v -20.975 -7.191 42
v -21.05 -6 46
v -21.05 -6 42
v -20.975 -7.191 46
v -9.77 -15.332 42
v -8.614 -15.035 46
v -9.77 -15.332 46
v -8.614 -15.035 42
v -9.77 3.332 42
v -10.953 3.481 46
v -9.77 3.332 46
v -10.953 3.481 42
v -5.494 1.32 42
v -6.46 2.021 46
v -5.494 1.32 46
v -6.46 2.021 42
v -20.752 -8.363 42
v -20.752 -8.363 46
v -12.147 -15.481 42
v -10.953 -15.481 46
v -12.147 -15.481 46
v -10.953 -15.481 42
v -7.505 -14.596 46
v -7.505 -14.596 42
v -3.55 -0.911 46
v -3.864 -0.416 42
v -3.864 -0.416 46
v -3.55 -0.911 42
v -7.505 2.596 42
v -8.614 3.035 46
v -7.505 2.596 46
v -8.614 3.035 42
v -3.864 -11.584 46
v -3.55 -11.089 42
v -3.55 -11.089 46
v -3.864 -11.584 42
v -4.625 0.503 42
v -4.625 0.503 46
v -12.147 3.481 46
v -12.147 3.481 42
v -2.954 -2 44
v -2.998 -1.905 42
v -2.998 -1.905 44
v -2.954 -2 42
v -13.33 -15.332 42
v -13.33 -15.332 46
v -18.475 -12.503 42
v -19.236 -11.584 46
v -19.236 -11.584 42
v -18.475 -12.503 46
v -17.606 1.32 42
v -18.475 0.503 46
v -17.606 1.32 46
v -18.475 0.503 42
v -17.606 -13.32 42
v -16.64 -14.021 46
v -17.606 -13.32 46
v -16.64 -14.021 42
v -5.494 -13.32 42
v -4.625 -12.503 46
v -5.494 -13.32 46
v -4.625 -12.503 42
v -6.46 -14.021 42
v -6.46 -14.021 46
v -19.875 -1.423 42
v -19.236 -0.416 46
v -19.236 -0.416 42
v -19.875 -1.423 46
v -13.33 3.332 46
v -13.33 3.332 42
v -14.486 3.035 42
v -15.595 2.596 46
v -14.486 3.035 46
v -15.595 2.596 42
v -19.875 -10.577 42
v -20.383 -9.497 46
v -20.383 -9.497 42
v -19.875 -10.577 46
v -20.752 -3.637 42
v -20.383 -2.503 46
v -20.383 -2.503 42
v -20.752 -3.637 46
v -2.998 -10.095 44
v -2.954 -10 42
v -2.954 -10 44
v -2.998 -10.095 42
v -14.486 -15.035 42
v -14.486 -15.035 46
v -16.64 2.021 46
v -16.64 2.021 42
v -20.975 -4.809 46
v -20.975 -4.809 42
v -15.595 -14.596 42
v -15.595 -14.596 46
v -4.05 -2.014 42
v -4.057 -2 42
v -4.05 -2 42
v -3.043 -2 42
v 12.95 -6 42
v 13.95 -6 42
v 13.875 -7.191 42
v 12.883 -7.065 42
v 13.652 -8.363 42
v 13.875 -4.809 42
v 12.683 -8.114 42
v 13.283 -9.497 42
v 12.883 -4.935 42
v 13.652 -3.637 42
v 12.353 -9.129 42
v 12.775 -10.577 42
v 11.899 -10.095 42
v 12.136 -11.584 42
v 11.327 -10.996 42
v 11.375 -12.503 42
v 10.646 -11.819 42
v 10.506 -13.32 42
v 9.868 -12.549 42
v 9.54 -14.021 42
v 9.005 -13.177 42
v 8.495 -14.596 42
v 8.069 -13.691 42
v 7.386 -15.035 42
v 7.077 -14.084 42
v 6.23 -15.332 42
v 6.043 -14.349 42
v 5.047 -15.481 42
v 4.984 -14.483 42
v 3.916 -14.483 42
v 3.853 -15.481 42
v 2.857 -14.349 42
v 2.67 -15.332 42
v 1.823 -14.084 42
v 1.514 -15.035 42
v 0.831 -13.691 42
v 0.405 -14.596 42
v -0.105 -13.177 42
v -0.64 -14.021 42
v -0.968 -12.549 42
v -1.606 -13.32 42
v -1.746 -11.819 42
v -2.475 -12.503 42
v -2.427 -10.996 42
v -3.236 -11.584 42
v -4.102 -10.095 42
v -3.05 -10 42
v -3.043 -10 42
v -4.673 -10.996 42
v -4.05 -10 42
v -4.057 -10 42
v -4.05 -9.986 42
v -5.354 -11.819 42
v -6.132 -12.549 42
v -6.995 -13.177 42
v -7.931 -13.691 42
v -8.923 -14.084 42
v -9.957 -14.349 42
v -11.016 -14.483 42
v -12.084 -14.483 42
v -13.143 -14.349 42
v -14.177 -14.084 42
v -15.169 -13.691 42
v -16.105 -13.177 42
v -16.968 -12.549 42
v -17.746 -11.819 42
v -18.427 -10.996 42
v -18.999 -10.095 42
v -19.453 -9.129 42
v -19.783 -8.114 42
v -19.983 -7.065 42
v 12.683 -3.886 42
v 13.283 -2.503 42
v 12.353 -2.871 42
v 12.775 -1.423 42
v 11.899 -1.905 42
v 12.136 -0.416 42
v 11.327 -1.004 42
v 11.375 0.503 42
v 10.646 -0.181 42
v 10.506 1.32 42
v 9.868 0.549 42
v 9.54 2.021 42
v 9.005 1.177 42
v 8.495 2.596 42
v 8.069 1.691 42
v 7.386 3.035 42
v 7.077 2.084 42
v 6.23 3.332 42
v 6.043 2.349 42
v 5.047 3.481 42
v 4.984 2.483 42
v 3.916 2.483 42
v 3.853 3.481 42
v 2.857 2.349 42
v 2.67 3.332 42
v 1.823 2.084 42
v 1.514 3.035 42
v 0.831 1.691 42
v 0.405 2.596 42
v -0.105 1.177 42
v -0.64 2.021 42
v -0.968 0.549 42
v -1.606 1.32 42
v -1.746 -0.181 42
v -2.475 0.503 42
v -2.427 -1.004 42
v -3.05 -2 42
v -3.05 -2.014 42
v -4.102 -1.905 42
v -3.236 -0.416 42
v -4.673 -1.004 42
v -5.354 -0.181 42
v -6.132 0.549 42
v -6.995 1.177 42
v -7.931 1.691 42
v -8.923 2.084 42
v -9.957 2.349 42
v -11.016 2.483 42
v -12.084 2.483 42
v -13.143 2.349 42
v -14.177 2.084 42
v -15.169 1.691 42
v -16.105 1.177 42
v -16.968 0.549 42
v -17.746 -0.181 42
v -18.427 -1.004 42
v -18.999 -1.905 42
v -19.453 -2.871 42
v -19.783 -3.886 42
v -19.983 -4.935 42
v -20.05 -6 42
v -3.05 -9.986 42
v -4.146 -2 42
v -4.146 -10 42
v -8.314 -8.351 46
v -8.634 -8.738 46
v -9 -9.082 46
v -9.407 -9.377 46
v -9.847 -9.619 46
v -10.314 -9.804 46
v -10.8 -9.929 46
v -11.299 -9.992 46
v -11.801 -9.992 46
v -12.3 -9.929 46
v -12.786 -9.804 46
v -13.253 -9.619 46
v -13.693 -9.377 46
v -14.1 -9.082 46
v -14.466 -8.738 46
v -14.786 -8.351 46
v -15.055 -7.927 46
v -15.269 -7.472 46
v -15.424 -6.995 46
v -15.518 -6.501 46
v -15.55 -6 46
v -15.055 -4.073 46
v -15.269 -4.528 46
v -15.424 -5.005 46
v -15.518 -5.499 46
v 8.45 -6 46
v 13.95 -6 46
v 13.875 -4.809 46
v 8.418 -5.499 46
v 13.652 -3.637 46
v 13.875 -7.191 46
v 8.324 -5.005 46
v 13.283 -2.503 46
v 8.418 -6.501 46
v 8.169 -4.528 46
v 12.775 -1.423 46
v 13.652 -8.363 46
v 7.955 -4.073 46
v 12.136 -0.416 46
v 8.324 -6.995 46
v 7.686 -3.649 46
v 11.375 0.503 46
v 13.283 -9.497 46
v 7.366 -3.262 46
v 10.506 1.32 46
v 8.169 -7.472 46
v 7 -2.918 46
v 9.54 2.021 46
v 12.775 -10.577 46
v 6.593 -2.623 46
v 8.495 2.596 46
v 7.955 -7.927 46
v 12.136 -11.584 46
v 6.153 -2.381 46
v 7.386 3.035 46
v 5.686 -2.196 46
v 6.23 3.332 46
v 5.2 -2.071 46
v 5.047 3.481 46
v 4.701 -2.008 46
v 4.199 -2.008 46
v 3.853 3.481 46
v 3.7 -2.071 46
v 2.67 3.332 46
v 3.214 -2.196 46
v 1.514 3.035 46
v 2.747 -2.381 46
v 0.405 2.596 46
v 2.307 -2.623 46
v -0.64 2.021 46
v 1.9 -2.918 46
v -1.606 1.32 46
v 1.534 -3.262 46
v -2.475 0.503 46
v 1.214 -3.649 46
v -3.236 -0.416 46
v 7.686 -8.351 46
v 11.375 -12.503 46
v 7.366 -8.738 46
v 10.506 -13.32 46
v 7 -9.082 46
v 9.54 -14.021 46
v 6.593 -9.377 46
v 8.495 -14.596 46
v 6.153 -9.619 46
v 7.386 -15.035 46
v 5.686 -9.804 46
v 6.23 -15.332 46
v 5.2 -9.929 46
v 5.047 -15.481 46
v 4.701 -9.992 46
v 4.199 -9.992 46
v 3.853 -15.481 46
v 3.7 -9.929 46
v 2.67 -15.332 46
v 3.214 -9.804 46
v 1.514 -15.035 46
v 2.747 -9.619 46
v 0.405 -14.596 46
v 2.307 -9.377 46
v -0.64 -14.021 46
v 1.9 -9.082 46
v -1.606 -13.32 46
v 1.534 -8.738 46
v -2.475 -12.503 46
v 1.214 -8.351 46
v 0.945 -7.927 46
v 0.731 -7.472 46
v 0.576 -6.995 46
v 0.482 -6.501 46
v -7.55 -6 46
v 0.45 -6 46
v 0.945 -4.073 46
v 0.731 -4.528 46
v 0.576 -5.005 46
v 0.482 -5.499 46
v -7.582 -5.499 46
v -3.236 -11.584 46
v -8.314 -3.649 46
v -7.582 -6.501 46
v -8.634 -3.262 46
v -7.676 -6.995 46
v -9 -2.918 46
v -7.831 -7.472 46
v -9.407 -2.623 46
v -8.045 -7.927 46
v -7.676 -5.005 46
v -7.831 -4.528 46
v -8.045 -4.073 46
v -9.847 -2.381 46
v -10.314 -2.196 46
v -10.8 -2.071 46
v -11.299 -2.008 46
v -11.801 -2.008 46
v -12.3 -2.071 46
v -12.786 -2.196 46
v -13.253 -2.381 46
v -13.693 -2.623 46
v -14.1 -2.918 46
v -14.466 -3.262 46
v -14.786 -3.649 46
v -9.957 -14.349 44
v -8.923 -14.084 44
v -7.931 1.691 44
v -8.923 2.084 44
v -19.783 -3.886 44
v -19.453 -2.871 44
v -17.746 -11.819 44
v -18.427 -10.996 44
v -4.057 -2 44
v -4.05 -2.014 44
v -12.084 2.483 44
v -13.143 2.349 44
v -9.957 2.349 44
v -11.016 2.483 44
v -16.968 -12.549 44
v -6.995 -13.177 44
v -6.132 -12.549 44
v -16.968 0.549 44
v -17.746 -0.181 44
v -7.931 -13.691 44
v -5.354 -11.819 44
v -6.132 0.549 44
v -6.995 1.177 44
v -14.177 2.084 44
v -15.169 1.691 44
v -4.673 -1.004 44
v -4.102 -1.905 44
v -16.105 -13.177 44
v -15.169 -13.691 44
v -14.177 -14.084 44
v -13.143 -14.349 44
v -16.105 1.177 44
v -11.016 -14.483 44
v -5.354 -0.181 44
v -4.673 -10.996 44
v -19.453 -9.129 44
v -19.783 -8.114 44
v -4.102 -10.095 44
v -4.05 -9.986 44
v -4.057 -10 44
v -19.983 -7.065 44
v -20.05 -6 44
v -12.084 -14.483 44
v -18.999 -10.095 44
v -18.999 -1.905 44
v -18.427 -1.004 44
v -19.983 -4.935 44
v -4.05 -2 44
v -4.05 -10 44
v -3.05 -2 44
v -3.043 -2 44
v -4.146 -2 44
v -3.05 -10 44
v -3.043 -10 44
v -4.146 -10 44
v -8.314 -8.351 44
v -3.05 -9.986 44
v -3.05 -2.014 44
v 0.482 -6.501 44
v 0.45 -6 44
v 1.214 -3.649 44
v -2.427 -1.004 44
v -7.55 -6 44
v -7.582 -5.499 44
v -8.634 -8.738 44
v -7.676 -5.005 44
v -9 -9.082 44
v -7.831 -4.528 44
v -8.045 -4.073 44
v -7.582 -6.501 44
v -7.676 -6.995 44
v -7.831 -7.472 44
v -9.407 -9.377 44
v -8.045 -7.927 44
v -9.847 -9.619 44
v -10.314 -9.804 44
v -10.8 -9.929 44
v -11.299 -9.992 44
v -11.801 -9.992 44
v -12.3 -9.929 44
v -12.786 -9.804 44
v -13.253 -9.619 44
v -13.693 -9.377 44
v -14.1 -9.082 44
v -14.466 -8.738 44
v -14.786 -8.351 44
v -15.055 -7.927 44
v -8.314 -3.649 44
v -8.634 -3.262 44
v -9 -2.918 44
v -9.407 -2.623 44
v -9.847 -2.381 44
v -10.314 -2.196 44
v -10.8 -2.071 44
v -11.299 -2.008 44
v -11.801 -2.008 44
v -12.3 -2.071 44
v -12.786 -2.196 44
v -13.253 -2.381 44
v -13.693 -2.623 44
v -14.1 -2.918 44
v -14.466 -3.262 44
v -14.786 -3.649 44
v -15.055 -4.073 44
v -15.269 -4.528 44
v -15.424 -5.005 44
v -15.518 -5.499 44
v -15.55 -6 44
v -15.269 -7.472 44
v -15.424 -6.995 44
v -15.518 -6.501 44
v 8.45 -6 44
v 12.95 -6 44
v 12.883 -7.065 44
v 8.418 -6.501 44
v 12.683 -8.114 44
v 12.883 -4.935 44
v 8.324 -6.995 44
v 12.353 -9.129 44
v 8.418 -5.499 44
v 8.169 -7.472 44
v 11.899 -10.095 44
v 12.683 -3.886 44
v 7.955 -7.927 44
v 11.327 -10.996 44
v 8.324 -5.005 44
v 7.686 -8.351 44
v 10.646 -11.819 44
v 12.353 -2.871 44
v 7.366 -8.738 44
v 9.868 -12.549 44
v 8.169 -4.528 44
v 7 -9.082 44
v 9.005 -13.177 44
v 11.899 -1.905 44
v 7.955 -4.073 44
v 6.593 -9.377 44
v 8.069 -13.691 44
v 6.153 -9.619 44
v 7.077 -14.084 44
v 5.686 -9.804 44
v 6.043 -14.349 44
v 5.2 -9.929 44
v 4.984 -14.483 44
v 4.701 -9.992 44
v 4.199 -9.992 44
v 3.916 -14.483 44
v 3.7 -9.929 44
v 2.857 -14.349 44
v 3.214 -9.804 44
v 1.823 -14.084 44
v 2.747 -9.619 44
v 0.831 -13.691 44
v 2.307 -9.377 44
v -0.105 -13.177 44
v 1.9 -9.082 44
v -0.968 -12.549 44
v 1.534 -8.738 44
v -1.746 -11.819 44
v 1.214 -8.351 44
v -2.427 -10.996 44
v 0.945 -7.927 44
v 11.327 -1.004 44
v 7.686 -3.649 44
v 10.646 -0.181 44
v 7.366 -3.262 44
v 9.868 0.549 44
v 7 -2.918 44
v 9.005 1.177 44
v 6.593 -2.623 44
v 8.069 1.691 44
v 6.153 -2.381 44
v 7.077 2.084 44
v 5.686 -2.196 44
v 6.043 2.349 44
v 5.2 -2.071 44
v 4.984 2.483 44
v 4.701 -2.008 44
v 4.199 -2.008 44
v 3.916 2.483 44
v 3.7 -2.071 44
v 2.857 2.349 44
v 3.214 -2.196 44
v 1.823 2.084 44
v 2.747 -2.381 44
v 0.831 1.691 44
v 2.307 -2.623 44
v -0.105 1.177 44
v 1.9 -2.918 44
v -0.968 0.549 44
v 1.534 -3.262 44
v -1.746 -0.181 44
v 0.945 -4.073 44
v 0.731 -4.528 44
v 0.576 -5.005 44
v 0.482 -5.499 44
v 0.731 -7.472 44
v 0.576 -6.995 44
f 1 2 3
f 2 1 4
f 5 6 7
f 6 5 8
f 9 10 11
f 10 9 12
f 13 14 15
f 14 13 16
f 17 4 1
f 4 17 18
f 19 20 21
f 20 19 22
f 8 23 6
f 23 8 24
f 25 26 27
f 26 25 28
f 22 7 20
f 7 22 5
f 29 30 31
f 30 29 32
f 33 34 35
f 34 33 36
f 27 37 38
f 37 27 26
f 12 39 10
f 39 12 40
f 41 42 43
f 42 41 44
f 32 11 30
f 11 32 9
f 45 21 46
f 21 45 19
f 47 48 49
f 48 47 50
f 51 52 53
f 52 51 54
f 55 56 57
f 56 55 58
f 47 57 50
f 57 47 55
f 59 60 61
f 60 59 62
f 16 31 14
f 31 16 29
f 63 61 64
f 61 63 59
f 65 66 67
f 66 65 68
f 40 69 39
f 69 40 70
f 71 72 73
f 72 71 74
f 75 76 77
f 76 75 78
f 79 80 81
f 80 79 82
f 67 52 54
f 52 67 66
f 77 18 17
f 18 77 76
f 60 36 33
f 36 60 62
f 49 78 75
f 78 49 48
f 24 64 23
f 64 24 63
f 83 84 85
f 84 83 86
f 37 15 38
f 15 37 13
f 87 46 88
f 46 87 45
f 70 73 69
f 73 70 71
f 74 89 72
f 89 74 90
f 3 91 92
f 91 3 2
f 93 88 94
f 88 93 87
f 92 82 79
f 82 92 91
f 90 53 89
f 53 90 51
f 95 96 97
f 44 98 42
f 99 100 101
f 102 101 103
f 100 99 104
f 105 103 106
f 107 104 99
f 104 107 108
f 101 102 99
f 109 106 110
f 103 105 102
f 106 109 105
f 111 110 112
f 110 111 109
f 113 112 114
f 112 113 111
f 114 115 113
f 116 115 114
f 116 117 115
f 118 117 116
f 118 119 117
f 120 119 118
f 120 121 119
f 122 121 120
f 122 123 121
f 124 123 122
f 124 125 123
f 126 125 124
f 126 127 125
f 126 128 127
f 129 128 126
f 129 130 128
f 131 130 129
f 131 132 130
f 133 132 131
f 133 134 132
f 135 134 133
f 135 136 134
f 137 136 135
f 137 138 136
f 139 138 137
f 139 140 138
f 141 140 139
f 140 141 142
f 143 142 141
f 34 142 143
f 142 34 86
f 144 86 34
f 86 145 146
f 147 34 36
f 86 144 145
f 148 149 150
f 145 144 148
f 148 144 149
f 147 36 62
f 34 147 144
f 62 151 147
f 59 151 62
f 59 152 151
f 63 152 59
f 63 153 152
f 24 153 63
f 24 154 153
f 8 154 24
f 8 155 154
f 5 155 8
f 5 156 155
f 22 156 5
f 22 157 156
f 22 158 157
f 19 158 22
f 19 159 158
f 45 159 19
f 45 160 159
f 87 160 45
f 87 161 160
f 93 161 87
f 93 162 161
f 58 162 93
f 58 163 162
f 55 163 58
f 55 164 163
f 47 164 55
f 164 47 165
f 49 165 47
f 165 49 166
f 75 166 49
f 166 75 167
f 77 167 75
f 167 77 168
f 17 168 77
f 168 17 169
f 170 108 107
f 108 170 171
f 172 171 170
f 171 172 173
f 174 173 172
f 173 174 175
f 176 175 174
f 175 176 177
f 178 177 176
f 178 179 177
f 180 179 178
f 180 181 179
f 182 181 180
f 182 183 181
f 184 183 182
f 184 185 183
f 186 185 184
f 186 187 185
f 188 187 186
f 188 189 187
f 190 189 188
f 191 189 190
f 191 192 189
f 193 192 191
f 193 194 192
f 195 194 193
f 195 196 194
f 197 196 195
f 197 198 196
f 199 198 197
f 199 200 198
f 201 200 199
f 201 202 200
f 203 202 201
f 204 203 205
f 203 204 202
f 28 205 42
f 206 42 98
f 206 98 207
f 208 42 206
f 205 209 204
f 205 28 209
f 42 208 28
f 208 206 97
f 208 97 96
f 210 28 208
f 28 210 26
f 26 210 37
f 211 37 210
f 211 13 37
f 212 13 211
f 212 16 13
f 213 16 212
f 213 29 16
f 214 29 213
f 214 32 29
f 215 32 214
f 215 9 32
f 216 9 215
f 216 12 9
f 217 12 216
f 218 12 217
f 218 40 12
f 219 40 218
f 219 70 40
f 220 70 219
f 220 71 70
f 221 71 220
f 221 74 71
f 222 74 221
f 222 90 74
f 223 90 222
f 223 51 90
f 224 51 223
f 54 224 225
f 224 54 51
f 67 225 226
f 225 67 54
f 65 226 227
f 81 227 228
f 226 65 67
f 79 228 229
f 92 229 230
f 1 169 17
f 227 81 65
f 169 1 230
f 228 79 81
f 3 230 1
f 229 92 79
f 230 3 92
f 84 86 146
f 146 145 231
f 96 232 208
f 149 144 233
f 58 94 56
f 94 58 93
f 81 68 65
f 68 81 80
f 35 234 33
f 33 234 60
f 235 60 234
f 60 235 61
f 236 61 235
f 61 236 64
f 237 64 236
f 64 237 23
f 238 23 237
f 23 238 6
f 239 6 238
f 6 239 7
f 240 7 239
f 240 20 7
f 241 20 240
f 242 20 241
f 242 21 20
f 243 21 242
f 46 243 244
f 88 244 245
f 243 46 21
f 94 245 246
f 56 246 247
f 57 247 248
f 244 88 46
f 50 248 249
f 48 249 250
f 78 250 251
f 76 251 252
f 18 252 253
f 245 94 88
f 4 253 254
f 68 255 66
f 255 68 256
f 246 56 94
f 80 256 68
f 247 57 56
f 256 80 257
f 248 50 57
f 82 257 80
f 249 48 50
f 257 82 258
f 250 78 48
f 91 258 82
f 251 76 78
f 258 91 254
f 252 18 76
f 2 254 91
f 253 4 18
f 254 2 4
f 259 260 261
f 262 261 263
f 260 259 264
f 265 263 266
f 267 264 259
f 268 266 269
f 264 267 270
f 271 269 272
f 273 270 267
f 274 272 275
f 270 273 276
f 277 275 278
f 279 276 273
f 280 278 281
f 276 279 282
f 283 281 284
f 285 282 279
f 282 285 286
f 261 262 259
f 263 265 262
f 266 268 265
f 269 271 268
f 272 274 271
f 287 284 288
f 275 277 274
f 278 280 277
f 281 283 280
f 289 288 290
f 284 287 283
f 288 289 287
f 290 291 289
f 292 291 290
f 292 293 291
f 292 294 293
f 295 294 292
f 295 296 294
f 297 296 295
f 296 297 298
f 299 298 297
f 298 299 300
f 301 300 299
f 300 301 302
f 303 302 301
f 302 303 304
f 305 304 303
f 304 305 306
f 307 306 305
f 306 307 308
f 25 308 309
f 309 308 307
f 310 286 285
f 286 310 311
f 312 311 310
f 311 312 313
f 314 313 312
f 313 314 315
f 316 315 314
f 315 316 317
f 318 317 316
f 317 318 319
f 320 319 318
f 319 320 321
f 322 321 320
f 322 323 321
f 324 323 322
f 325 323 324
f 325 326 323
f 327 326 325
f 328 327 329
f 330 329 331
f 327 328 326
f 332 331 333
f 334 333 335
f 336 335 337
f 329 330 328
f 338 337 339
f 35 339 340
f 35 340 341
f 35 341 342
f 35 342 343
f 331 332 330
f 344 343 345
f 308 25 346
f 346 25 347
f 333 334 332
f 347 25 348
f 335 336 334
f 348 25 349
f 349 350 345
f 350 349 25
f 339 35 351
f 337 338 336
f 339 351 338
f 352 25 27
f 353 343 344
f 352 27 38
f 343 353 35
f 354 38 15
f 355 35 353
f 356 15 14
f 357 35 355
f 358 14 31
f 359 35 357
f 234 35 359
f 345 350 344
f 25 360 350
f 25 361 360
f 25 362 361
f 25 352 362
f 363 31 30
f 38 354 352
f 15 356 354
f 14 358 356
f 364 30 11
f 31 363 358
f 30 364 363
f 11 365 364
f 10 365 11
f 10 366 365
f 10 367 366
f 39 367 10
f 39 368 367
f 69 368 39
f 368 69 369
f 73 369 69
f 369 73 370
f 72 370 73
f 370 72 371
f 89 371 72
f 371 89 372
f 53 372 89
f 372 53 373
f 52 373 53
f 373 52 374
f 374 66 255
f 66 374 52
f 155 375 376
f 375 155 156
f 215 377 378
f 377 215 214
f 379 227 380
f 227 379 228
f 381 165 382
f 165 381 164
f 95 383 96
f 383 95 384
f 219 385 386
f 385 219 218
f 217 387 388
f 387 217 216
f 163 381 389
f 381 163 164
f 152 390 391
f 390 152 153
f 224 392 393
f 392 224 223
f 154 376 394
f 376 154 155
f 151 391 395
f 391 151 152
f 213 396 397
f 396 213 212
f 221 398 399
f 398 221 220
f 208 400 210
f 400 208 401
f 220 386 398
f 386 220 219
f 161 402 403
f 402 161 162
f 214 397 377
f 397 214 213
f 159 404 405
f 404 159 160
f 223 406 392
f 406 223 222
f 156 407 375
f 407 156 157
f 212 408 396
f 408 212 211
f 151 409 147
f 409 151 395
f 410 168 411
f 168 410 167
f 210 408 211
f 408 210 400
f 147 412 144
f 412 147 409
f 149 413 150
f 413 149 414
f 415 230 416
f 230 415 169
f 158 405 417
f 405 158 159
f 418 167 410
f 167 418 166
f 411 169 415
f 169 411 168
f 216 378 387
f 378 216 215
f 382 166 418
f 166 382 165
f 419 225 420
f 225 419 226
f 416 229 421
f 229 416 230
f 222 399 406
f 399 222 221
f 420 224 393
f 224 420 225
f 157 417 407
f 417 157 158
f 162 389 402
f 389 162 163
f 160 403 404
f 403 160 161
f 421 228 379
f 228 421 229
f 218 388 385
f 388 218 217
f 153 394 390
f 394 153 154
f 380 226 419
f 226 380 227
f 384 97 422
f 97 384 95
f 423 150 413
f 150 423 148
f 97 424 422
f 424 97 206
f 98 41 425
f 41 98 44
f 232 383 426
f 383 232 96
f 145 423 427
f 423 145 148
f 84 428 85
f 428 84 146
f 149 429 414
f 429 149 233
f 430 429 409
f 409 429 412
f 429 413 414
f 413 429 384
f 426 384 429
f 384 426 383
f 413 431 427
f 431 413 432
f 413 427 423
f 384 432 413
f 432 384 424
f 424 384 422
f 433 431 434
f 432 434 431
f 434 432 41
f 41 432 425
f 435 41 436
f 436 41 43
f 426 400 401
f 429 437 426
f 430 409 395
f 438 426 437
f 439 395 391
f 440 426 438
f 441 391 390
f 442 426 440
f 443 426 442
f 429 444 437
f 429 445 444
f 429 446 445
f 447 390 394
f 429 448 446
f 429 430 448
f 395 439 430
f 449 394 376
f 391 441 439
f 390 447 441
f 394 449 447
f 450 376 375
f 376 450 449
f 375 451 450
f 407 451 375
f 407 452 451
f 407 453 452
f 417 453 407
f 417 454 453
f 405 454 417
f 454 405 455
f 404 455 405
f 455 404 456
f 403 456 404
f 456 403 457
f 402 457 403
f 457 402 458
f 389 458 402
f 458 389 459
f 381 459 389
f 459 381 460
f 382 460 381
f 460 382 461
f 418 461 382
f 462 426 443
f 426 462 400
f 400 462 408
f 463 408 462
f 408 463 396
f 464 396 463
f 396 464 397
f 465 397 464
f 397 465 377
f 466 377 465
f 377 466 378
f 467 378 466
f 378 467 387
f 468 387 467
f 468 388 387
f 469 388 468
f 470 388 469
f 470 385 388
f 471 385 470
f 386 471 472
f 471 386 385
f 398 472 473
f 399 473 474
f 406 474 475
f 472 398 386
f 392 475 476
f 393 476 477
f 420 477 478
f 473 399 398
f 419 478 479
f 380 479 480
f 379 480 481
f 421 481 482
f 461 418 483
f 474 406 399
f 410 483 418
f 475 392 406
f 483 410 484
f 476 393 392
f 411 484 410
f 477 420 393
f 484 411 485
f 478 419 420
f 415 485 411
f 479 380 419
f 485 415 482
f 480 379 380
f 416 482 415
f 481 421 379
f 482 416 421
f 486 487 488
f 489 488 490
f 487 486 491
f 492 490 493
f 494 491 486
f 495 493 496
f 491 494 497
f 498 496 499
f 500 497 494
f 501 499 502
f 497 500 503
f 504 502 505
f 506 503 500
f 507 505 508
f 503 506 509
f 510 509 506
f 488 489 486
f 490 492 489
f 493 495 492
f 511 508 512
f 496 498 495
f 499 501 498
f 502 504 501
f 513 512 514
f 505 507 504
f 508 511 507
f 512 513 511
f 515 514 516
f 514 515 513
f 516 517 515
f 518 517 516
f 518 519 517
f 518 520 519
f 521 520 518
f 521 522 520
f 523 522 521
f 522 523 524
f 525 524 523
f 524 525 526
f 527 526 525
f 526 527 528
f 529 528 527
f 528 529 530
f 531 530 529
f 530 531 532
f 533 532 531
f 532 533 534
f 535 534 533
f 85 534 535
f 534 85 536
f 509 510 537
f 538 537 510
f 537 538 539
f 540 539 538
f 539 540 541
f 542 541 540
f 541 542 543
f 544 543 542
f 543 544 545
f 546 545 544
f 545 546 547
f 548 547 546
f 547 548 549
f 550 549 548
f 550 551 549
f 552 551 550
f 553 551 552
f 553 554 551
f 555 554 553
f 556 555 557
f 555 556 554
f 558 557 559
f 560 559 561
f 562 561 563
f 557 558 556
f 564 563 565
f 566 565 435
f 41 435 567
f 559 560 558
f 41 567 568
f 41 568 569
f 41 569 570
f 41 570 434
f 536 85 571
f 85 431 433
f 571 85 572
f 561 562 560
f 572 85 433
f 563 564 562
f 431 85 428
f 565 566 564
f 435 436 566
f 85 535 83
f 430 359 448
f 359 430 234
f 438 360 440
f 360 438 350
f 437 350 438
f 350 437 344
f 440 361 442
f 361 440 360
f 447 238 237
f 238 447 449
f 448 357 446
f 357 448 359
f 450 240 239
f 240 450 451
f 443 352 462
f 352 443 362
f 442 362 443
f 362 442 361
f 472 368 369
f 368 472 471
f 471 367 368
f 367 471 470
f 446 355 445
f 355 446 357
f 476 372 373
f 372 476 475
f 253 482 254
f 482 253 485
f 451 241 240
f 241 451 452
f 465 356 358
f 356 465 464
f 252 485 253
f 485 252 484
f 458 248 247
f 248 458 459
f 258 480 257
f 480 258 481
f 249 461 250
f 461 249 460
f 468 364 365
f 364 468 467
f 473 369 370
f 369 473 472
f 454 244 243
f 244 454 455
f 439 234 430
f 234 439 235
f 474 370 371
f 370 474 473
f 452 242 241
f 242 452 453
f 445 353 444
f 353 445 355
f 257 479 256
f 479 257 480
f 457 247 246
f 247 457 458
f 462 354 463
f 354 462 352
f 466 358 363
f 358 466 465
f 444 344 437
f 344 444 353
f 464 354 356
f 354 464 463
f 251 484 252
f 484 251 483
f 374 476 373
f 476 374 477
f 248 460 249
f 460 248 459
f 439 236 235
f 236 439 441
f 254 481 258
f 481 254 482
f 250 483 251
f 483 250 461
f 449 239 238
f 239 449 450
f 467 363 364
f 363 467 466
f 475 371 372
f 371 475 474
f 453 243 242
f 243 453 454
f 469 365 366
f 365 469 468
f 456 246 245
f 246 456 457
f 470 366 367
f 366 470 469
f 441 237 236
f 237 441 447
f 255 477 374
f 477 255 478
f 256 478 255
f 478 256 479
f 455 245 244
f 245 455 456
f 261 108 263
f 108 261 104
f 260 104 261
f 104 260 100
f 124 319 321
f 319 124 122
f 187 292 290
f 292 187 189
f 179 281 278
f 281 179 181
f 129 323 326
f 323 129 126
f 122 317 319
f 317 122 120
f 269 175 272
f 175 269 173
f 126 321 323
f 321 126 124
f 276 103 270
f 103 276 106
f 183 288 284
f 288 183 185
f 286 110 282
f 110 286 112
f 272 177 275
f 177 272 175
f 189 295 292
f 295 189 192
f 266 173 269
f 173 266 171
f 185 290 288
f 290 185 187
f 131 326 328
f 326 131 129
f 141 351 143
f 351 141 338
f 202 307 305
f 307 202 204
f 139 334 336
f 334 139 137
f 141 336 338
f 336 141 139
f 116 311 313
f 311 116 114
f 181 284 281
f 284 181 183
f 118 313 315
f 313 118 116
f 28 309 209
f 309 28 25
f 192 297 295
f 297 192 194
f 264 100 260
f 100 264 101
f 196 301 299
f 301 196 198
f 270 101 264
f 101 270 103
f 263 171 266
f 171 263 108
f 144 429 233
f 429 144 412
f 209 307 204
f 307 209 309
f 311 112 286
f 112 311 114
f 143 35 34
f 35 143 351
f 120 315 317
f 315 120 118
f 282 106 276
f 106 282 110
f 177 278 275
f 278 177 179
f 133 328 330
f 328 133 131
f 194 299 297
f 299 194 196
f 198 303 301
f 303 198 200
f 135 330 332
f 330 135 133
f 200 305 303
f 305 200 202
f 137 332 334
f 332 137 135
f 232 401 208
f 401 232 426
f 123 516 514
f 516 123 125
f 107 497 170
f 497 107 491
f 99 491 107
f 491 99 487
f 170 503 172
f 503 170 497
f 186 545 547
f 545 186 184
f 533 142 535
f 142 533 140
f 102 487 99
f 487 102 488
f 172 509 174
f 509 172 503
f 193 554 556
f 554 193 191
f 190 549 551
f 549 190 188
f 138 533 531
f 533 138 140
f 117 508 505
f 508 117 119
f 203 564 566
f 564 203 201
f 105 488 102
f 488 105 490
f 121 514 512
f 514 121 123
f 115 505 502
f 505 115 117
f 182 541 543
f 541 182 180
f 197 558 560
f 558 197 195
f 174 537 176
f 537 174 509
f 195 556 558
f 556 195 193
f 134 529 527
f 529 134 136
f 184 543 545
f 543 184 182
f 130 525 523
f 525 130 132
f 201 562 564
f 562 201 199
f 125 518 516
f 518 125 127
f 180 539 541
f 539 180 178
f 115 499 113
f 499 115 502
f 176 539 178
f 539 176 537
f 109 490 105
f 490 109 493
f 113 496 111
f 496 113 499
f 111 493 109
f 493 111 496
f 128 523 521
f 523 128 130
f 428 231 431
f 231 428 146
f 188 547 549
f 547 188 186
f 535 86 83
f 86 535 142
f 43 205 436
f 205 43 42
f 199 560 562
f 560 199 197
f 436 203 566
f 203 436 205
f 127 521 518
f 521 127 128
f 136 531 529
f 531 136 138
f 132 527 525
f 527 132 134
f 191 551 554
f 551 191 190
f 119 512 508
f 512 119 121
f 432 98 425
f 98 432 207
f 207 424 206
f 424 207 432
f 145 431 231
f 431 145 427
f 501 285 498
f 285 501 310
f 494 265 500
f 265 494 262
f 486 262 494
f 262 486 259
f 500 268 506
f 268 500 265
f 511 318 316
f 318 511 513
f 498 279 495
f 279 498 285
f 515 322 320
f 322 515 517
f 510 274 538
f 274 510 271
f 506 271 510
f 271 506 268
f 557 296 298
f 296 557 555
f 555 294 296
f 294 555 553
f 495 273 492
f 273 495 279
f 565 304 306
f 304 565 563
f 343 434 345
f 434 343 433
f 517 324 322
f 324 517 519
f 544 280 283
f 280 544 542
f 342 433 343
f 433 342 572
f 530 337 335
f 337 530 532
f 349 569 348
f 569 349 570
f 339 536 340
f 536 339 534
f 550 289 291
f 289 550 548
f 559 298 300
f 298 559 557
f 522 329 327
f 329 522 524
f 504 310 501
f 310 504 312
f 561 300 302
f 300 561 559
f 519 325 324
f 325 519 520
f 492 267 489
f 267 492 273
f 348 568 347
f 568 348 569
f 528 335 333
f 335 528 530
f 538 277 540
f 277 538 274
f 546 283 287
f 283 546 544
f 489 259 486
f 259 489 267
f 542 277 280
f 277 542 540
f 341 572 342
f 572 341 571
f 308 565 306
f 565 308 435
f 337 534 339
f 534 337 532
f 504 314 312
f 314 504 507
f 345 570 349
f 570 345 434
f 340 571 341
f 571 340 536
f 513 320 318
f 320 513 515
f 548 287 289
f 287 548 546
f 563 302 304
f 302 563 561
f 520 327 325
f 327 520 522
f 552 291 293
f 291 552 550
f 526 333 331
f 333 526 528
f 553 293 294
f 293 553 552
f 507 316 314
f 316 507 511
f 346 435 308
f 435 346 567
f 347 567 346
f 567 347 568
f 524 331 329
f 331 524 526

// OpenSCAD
$fn = 50;

render_platform = false;
render_stage = false;
render_sensor_cap = true;
render_solenoid = false;
render_cartridge = false;

// all units in millimeters

solenoid_body_color = "Red";
// dimensions for solenoid at http://www.amazon.com/gp/product/B00DUYPQHU/ref=oh_aui_detailpage_o03_s00?ie=UTF8&psc=1
solenoid_body_height = 30;
solenoid_body_width = 25;
solenoid_body_length = 51;

solenoid_rod_color = "Black";
solenoid_stroke = 7.1;
solenoid_rod_min = 6;

platform_color = "LightBlue";
platform_height = 16;
platform_back_margin = 15;
platform_width = 80;
platform_length = 120;
platform_anchor_tolerance = 0.04;
platform_anchor_r = 3 + platform_anchor_tolerance; // half of d plus 0.04 tolerance
echo("platform_anchor_r = ", platform_anchor_r);
platform_anchor_rk = 9.78 / 2 + platform_anchor_tolerance; // half of dk plus 0.04 tolerance
echo("platform_anchor_rk = ", platform_anchor_rk);
platform_anchor_k = (5.7 + 0.3) * 2; // 0.3mm extra depth, and k is doubled for modeling
echo("platform_anchor_k = ", platform_anchor_k);
platform_anchor_spacing = 50;
platform_anchor_setback = -platform_anchor_spacing / 2;
platform_wiring_slot_length = 4;
platform_wiring_slot_width = 10;
platform_wiring_slot_margin = 4;

teflon_pad_thickness = 0.8;

stage_color = "LightGreen";
stage_elevation = 38;
stage_height = stage_elevation - platform_height - 2 * teflon_pad_thickness;
stage_bevel_radius = 2;
stage_width = 40;

platform_side_width = 10;
echo("platform_side_width = ", platform_side_width);
platform_side_length = platform_anchor_spacing - 2 * platform_anchor_rk;
echo("platform_side_length = ", platform_side_length);
platform_side_height = stage_elevation - platform_height;
echo("platform_side_height = ", platform_side_height);

stage_length = platform_side_length - solenoid_stroke;
echo("stage_length = ", stage_length);

platform_bumper_height = platform_side_height;
echo("platform_bumper_height = ", platform_bumper_height);
platform_bumper_length = 10;
echo("platform_bumper_length = ", platform_bumper_length);
platform_bumper_width = (platform_width - stage_width) / 2 - platform_side_width;
echo("platform_bumper_width = ", platform_bumper_width);

stage_rail_length = stage_length - platform_bumper_length - teflon_pad_thickness;
echo("stage_rail_length = ", stage_rail_length);
stage_rail_width = platform_width - 2 * platform_side_width - 3.5 * teflon_pad_thickness;
echo("stage_rail_width = ", stage_rail_width);
stage_rail_height = 0.5 * platform_side_height - 2 * teflon_pad_thickness;
echo("stage_rail_height = ", stage_rail_height);

platform_rail_width = platform_bumper_width - 2 * teflon_pad_thickness;
echo("platform_rail_width = ", platform_rail_width);
platform_rail_length = platform_side_length - platform_bumper_length;
echo("platform_rail_length = ", platform_rail_length);
platform_rail_height = 0.5 * platform_side_height - 2 * teflon_pad_thickness;
echo("platform_rail_height = ", platform_rail_height);

cartridge_well_width = 8;
cartridge_well_distance_from_centerline = 4;
cartridge_path_width = 1.5;
accessory_x_spacing = 16;
accessory_y_offset = 12;
accessory_x_offset = cartridge_well_width;
echo("accessory_x_offset = ", accessory_x_offset);

solenoid_margin = 0.5;
solenoid_podium_length = solenoid_body_length + 2 * solenoid_margin;
echo("solenoid_podium_length = ", solenoid_podium_length);
solenoid_podium_width = solenoid_body_width + 2 * solenoid_margin;
echo("solenoid_podium_width = ", solenoid_podium_width);

//stage_center_of_mass_y = 2 * teflon_pad_thickness + (stage_height * stage_width * stage_length * (stage_height / 2) + 2 * stage_rail_height * (stage_rail_width - stage_width) * stage_rail_length * (stage_rail_height / 2)) / (stage_height * stage_width * stage_length + stage_rail_height * 2 * (stage_rail_width - stage_width) * stage_rail_length);

stage_center_of_mass_y = 12.5;
echo("stage_center_of_mass_y = ", stage_center_of_mass_y);
solenoid_podium_height = stage_center_of_mass_y - solenoid_body_height / 2;
echo("solenoid_podium_height = ", solenoid_podium_height);
echo("solenoid_elevation = ", platform_height + solenoid_podium_height + solenoid_body_height);

support_height = stage_height;
support_z_offset = platform_height + 2 * teflon_pad_thickness;

if (render_platform) {
	// platform
	color(platform_color) {
		difference() {
			translate([-(platform_length / 2 - platform_anchor_spacing / 2 - platform_back_margin), 0, platform_height / 2])
				cube([platform_length, platform_width, platform_height], center = true);

	// anchor holes
			translate([platform_anchor_spacing + platform_anchor_setback, platform_anchor_spacing / 2, platform_height]) {
				cylinder(r = platform_anchor_r, h = 2 * platform_height, center = true);
				cylinder(r = platform_anchor_rk, h = platform_anchor_k, center = true);
			}
			translate([platform_anchor_setback, -platform_anchor_spacing / 2, platform_height]) {
				cylinder(r = platform_anchor_r, h = 2 * platform_height, center = true);
				cylinder(r = platform_anchor_rk, h = platform_anchor_k, center = true);
			}
			translate([platform_anchor_spacing + platform_anchor_setback, -platform_anchor_spacing / 2, platform_height]) {
				cylinder(r = platform_anchor_r, h = 2 * platform_height, center = true);
				cylinder(r = platform_anchor_rk, h = platform_anchor_k, center = true);
			}
			translate([platform_anchor_setback, platform_anchor_spacing / 2, platform_height]) {
				cylinder(r = platform_anchor_r, h = 2 * platform_height, center = true);
				cylinder(r = platform_anchor_rk, h = platform_anchor_k, center = true);
			}

	// wire terminal holes
			translate([-38, -26, platform_height]) {
				cylinder(r = 1.5, h = 40, center = true);
			}
			translate([-46, -26, platform_height]) {
				cylinder(r = 1.5, h = 40, center = true);
			}
			translate([-54, -26, platform_height]) {
				cylinder(r = 1.5, h = 40, center = true);
			}
			translate([-62, -26, platform_height]) {
				cylinder(r = 1.5, h = 40, center = true);
			}

	// solenoid holes
			translate([-platform_side_length / 2 - solenoid_rod_min - 8, solenoid_podium_width / 2 - 4, platform_height]) {
				cylinder(r = 2, h = 40, center = true);
			}
			translate([-platform_side_length / 2 - solenoid_rod_min - 8, -solenoid_podium_width / 2 + 4, platform_height]) {
				cylinder(r = 2, h = 40, center = true);
			}
			translate([-platform_side_length / 2 - solenoid_rod_min - 43, solenoid_podium_width / 2 - 4, platform_height]) {
				cylinder(r = 2, h = 40, center = true);
			}
			translate([-platform_side_length / 2 - solenoid_rod_min - 43, -solenoid_podium_width / 2 + 4, platform_height]) {
				cylinder(r = 2, h = 40, center = true);
			}

			if (solenoid_podium_height < 0) {
				translate([-(platform_side_length + solenoid_podium_length) / 2 - solenoid_rod_min + solenoid_margin, 0, platform_height + solenoid_podium_height / 2]) {
					cube([solenoid_podium_length, solenoid_podium_width, -2 * solenoid_podium_height], center = true);
//					translate([6, 0, -0.7]) cube([solenoid_podium_length - 12, solenoid_podium_width, -2 * solenoid_podium_height], center = true);
				}
			}
		}
	}
	
	// platform sides
	color(platform_color) {
		translate([0,  (platform_width - platform_side_width) / 2, platform_height + platform_side_height / 2])
			cube([platform_side_length, platform_side_width, platform_side_height], center = true);
	}
	
	color(platform_color) {
		translate([0, -(platform_width - platform_side_width) / 2, platform_height + platform_side_height / 2])
			cube([platform_side_length, platform_side_width, platform_side_height], center = true);
	}
	
	// platform rails
	color(platform_color) {
		translate([-(platform_side_length - platform_rail_length) / 2 + platform_bumper_length, ((platform_width - platform_rail_width) / 2 - platform_side_width), platform_height + platform_side_height - platform_rail_height / 2])
			cube([platform_rail_length, platform_rail_width, platform_rail_height], center = true);
	}
	
	color(platform_color) {
		translate([-(platform_side_length - platform_rail_length) / 2 + platform_bumper_length,  -((platform_width - platform_rail_width) / 2 - platform_side_width), platform_height + platform_side_height - platform_rail_height / 2])
			cube([platform_rail_length, platform_rail_width, platform_rail_height], center = true);
	}
	
	// platform stage bumper
	color(platform_color) {
		translate([-(platform_side_length - platform_bumper_length) / 2, platform_width / 2 - platform_side_width - platform_rail_width / 2, platform_height + platform_bumper_height / 2])
			cube([platform_bumper_length, platform_rail_width, platform_bumper_height], center = true);
	}
	
	color(platform_color) {
		translate([-(platform_side_length - platform_bumper_length) / 2, -(platform_width / 2 - platform_side_width - platform_rail_width / 2), platform_height + platform_bumper_height / 2])
			cube([platform_bumper_length, platform_rail_width, platform_bumper_height], center = true);
	}
	
	// solenoid podium
	if (solenoid_podium_height > 0) {
		color(platform_color) {
			translate([-(platform_side_length + solenoid_podium_length) / 2, 0, platform_height + solenoid_podium_height / 2])
				cube([solenoid_podium_length, solenoid_podium_width, solenoid_podium_height], center = true);
		}
	}
}

stage_x_offset = (stage_length - platform_side_length) / 2;
echo("stage_x_offset = ", stage_x_offset);
if (render_stage) {
	// stage 
	color(stage_color) {
		difference() {
			translate([stage_x_offset, 0, stage_elevation - stage_height / 2])
				cube([stage_length, stage_width, stage_height], center = true);

	// solenoid rod hole
			translate([-platform_side_length / 2, 0, platform_height + solenoid_podium_height + solenoid_body_height / 2])
				rotate([0, 90, 0]) cylinder(r = 1.75, h = 30, center = true);

	// solenoid rod nut slot
			translate([4 - platform_side_length / 2, 0, platform_height + solenoid_podium_height + solenoid_body_height / 2 - 3])
				cube([2.8, 6, 16], center = true);

	// accessory hole slots
	
			translate([0, accessory_y_offset, stage_elevation - 4])
				cube([46, 6, 2.8], center = true);

	// accessory holes
			for (x = [-accessory_x_offset, accessory_x_spacing - accessory_x_offset]) {
			translate([stage_x_offset + x, accessory_y_offset, stage_elevation])
				cylinder(r = 1.5, h = 24, center = true);
		}
	}
}
			for (x = [-accessory_x_offset, accessory_x_spacing - accessory_x_offset]) {
			translate([stage_x_offset + x, accessory_y_offset - 18, stage_elevation]) {
			difference() {
				cylinder(r = 8.3, h = 11, center = true);	
				cylinder(r = 7.6, h = 11, center = true);	
				translate([0, -8, 0]) cube([10, 4, 2], center = true);	
			}
			cylinder(r = 4, h = 8, center = true);	
		}
	}

	// stage rail
	
	color(stage_color) {
		translate([stage_x_offset + (stage_length - stage_rail_length) / 2, 0, platform_height + 2 * teflon_pad_thickness + stage_rail_height / 2])
			cube([stage_rail_length, stage_rail_width, stage_rail_height], center = true);
	}

//	for (y = [-19:4.5:0]) {
//		translate([13.5, y + 1, support_z_offset]) {
//			cube([8, 1, support_height - 1]);
//			translate([0, 0.25, support_height - 1]) cube([8, 0.5, 0.5]);
//			translate([0, 0.4, support_height - 0.5]) cube([8, 0.2, 0.5]);
//			}
//	}

}

if (render_sensor_cap) {
			translate([stage_x_offset - accessory_x_offset, accessory_y_offset - 18, stage_elevation + 6]) {
			difference() {
				cylinder(r = 9.5, h = 4, center = true);	
				cylinder(r = 8.5, h = 4, center = true);	
				cylinder(r = 4, h = 6, center = true);
				translate([9.5, 0, 0]) cube([4, 8, 4], center = true);
			}
		}
			translate([stage_x_offset - accessory_x_offset, accessory_y_offset - 18, stage_elevation + 7]) {
			difference() {
				cylinder(r = 9.5, h = 2, center = true);	
				cylinder(r = 4, h = 6, center = true);
			}
		}

			translate([stage_x_offset + accessory_x_spacing - accessory_x_offset, accessory_y_offset - 18, stage_elevation + 6]) {
			difference() {
				cylinder(r = 9.5, h = 4, center = true);	
				cylinder(r = 8.5, h = 4, center = true);	
				cylinder(r = 4, h = 6, center = true);	
				translate([-9.5, 0, 0]) cube([4, 8, 4], center = true);
			}
		}
			translate([stage_x_offset + accessory_x_spacing - accessory_x_offset, accessory_y_offset - 18, stage_elevation + 7]) {
			difference() {
				cylinder(r = 9.5, h = 2, center = true);	
				cylinder(r = 4, h = 6, center = true);	
			}
		}
}

if (render_solenoid) {
	// solenoid body
	color(solenoid_body_color) {
		translate([-(platform_side_length + solenoid_body_length) / 2 - solenoid_rod_min, 0, platform_height + solenoid_podium_height + solenoid_body_height / 2])
			cube([solenoid_body_length, solenoid_body_width, solenoid_body_height], center = true);
	}
	
	// solenoid rod
	color(solenoid_rod_color) {
		translate([-(platform_side_length + solenoid_stroke) / 2, 0, platform_height + solenoid_podium_height + solenoid_body_height / 2])
		rotate([0, 90, 0])
			cylinder(r = 1, h = solenoid_stroke, center = true);
	}
}

p_y = 1.5; // path width
p_x = 4; // path length
w_x = 6; // well length
w_y = 8; // well width
n = 8; // number of wells 
m = 8; //separation from midline
	
module base_card()
{translate([-5,-20])square([100,40]);}

module corner(f)
{difference(){square([f,f]);circle(r=f,$fn=50);}}

module path()
{union(){
	translate([w_x/2,-w_y/2])square([p_x,p_y]); // actual path
	translate([w_x/2+1,-w_y/2+p_y+1])rotate(180)corner(1);}}//rounded corners

module path2()
{union(){translate([2*w_x+1,-w_y/2])square([p_x,p_y]); // actual path
			 //translate([2*w_x+2,-p_y/2-1])rotate(90)corner(1);
	      translate([2*w_x+2,-w_y/2+1+p_y])rotate(180)corner(1);//rounded corners	
	      //translate([2*w_x+p_x,-p_y/2-1])corner(1);
	      translate([2*w_x+p_x,-w_y/2+1+p_y])rotate(270)corner(1);}}//rounded corners

module well()
{difference ()
	{	square([w_x,w_y], center=true); 
		translate([w_x/2-2,w_y/2-2])corner(2);
		translate([-(w_x/2-2),w_y/2-2])rotate(90)corner(2);
		//translate([-(w_x/2-2),-(w_y/2-2)])rotate(180)corner(2);
		//translate([w_x/2-2,-(w_y/2-2)])rotate(270)corner(2);
   }}

module color_well() // last well
{translate([n*(w_x+p_x)+1,0])
{difference ()
	{	square([w_y,w_y], center=true); 
		translate([w_y/2-2,w_y/2-2])corner(2);
		translate([-(w_y/2-2),w_y/2-2])rotate(90)corner(2);
		//translate([-(w_y/2-2),-(w_y/2-2)])rotate(180)corner(2);
		//translate([w_y/2-2,-(w_y/2-2)])rotate(270)corner(2);
   }}}

module sample_well() // first well
{union(){translate([0,-w_y/2-1])square([2*w_x+1,w_y+2]); path2();}}

module control_well() // first well
{union(){translate([p_x+w_x,0])well(); path2();}}

module set(){union(){color_well(); 
	{for (i =[2:(n-1)]){translate([i*(p_x+w_x),0]){well();path();}}} }} // 1 set of wells, paths and comb
	
if (render_cartridge) {
	translate([0, -20, 45]) rotate(90, 0, 0) linear_extrude(height = 2, center = true)
	difference(){base_card(); 
						translate([0,-m]){sample_well(); set(); square([12,6],center=true);} 
						translate([0,m]){control_well(); set();}}
}
